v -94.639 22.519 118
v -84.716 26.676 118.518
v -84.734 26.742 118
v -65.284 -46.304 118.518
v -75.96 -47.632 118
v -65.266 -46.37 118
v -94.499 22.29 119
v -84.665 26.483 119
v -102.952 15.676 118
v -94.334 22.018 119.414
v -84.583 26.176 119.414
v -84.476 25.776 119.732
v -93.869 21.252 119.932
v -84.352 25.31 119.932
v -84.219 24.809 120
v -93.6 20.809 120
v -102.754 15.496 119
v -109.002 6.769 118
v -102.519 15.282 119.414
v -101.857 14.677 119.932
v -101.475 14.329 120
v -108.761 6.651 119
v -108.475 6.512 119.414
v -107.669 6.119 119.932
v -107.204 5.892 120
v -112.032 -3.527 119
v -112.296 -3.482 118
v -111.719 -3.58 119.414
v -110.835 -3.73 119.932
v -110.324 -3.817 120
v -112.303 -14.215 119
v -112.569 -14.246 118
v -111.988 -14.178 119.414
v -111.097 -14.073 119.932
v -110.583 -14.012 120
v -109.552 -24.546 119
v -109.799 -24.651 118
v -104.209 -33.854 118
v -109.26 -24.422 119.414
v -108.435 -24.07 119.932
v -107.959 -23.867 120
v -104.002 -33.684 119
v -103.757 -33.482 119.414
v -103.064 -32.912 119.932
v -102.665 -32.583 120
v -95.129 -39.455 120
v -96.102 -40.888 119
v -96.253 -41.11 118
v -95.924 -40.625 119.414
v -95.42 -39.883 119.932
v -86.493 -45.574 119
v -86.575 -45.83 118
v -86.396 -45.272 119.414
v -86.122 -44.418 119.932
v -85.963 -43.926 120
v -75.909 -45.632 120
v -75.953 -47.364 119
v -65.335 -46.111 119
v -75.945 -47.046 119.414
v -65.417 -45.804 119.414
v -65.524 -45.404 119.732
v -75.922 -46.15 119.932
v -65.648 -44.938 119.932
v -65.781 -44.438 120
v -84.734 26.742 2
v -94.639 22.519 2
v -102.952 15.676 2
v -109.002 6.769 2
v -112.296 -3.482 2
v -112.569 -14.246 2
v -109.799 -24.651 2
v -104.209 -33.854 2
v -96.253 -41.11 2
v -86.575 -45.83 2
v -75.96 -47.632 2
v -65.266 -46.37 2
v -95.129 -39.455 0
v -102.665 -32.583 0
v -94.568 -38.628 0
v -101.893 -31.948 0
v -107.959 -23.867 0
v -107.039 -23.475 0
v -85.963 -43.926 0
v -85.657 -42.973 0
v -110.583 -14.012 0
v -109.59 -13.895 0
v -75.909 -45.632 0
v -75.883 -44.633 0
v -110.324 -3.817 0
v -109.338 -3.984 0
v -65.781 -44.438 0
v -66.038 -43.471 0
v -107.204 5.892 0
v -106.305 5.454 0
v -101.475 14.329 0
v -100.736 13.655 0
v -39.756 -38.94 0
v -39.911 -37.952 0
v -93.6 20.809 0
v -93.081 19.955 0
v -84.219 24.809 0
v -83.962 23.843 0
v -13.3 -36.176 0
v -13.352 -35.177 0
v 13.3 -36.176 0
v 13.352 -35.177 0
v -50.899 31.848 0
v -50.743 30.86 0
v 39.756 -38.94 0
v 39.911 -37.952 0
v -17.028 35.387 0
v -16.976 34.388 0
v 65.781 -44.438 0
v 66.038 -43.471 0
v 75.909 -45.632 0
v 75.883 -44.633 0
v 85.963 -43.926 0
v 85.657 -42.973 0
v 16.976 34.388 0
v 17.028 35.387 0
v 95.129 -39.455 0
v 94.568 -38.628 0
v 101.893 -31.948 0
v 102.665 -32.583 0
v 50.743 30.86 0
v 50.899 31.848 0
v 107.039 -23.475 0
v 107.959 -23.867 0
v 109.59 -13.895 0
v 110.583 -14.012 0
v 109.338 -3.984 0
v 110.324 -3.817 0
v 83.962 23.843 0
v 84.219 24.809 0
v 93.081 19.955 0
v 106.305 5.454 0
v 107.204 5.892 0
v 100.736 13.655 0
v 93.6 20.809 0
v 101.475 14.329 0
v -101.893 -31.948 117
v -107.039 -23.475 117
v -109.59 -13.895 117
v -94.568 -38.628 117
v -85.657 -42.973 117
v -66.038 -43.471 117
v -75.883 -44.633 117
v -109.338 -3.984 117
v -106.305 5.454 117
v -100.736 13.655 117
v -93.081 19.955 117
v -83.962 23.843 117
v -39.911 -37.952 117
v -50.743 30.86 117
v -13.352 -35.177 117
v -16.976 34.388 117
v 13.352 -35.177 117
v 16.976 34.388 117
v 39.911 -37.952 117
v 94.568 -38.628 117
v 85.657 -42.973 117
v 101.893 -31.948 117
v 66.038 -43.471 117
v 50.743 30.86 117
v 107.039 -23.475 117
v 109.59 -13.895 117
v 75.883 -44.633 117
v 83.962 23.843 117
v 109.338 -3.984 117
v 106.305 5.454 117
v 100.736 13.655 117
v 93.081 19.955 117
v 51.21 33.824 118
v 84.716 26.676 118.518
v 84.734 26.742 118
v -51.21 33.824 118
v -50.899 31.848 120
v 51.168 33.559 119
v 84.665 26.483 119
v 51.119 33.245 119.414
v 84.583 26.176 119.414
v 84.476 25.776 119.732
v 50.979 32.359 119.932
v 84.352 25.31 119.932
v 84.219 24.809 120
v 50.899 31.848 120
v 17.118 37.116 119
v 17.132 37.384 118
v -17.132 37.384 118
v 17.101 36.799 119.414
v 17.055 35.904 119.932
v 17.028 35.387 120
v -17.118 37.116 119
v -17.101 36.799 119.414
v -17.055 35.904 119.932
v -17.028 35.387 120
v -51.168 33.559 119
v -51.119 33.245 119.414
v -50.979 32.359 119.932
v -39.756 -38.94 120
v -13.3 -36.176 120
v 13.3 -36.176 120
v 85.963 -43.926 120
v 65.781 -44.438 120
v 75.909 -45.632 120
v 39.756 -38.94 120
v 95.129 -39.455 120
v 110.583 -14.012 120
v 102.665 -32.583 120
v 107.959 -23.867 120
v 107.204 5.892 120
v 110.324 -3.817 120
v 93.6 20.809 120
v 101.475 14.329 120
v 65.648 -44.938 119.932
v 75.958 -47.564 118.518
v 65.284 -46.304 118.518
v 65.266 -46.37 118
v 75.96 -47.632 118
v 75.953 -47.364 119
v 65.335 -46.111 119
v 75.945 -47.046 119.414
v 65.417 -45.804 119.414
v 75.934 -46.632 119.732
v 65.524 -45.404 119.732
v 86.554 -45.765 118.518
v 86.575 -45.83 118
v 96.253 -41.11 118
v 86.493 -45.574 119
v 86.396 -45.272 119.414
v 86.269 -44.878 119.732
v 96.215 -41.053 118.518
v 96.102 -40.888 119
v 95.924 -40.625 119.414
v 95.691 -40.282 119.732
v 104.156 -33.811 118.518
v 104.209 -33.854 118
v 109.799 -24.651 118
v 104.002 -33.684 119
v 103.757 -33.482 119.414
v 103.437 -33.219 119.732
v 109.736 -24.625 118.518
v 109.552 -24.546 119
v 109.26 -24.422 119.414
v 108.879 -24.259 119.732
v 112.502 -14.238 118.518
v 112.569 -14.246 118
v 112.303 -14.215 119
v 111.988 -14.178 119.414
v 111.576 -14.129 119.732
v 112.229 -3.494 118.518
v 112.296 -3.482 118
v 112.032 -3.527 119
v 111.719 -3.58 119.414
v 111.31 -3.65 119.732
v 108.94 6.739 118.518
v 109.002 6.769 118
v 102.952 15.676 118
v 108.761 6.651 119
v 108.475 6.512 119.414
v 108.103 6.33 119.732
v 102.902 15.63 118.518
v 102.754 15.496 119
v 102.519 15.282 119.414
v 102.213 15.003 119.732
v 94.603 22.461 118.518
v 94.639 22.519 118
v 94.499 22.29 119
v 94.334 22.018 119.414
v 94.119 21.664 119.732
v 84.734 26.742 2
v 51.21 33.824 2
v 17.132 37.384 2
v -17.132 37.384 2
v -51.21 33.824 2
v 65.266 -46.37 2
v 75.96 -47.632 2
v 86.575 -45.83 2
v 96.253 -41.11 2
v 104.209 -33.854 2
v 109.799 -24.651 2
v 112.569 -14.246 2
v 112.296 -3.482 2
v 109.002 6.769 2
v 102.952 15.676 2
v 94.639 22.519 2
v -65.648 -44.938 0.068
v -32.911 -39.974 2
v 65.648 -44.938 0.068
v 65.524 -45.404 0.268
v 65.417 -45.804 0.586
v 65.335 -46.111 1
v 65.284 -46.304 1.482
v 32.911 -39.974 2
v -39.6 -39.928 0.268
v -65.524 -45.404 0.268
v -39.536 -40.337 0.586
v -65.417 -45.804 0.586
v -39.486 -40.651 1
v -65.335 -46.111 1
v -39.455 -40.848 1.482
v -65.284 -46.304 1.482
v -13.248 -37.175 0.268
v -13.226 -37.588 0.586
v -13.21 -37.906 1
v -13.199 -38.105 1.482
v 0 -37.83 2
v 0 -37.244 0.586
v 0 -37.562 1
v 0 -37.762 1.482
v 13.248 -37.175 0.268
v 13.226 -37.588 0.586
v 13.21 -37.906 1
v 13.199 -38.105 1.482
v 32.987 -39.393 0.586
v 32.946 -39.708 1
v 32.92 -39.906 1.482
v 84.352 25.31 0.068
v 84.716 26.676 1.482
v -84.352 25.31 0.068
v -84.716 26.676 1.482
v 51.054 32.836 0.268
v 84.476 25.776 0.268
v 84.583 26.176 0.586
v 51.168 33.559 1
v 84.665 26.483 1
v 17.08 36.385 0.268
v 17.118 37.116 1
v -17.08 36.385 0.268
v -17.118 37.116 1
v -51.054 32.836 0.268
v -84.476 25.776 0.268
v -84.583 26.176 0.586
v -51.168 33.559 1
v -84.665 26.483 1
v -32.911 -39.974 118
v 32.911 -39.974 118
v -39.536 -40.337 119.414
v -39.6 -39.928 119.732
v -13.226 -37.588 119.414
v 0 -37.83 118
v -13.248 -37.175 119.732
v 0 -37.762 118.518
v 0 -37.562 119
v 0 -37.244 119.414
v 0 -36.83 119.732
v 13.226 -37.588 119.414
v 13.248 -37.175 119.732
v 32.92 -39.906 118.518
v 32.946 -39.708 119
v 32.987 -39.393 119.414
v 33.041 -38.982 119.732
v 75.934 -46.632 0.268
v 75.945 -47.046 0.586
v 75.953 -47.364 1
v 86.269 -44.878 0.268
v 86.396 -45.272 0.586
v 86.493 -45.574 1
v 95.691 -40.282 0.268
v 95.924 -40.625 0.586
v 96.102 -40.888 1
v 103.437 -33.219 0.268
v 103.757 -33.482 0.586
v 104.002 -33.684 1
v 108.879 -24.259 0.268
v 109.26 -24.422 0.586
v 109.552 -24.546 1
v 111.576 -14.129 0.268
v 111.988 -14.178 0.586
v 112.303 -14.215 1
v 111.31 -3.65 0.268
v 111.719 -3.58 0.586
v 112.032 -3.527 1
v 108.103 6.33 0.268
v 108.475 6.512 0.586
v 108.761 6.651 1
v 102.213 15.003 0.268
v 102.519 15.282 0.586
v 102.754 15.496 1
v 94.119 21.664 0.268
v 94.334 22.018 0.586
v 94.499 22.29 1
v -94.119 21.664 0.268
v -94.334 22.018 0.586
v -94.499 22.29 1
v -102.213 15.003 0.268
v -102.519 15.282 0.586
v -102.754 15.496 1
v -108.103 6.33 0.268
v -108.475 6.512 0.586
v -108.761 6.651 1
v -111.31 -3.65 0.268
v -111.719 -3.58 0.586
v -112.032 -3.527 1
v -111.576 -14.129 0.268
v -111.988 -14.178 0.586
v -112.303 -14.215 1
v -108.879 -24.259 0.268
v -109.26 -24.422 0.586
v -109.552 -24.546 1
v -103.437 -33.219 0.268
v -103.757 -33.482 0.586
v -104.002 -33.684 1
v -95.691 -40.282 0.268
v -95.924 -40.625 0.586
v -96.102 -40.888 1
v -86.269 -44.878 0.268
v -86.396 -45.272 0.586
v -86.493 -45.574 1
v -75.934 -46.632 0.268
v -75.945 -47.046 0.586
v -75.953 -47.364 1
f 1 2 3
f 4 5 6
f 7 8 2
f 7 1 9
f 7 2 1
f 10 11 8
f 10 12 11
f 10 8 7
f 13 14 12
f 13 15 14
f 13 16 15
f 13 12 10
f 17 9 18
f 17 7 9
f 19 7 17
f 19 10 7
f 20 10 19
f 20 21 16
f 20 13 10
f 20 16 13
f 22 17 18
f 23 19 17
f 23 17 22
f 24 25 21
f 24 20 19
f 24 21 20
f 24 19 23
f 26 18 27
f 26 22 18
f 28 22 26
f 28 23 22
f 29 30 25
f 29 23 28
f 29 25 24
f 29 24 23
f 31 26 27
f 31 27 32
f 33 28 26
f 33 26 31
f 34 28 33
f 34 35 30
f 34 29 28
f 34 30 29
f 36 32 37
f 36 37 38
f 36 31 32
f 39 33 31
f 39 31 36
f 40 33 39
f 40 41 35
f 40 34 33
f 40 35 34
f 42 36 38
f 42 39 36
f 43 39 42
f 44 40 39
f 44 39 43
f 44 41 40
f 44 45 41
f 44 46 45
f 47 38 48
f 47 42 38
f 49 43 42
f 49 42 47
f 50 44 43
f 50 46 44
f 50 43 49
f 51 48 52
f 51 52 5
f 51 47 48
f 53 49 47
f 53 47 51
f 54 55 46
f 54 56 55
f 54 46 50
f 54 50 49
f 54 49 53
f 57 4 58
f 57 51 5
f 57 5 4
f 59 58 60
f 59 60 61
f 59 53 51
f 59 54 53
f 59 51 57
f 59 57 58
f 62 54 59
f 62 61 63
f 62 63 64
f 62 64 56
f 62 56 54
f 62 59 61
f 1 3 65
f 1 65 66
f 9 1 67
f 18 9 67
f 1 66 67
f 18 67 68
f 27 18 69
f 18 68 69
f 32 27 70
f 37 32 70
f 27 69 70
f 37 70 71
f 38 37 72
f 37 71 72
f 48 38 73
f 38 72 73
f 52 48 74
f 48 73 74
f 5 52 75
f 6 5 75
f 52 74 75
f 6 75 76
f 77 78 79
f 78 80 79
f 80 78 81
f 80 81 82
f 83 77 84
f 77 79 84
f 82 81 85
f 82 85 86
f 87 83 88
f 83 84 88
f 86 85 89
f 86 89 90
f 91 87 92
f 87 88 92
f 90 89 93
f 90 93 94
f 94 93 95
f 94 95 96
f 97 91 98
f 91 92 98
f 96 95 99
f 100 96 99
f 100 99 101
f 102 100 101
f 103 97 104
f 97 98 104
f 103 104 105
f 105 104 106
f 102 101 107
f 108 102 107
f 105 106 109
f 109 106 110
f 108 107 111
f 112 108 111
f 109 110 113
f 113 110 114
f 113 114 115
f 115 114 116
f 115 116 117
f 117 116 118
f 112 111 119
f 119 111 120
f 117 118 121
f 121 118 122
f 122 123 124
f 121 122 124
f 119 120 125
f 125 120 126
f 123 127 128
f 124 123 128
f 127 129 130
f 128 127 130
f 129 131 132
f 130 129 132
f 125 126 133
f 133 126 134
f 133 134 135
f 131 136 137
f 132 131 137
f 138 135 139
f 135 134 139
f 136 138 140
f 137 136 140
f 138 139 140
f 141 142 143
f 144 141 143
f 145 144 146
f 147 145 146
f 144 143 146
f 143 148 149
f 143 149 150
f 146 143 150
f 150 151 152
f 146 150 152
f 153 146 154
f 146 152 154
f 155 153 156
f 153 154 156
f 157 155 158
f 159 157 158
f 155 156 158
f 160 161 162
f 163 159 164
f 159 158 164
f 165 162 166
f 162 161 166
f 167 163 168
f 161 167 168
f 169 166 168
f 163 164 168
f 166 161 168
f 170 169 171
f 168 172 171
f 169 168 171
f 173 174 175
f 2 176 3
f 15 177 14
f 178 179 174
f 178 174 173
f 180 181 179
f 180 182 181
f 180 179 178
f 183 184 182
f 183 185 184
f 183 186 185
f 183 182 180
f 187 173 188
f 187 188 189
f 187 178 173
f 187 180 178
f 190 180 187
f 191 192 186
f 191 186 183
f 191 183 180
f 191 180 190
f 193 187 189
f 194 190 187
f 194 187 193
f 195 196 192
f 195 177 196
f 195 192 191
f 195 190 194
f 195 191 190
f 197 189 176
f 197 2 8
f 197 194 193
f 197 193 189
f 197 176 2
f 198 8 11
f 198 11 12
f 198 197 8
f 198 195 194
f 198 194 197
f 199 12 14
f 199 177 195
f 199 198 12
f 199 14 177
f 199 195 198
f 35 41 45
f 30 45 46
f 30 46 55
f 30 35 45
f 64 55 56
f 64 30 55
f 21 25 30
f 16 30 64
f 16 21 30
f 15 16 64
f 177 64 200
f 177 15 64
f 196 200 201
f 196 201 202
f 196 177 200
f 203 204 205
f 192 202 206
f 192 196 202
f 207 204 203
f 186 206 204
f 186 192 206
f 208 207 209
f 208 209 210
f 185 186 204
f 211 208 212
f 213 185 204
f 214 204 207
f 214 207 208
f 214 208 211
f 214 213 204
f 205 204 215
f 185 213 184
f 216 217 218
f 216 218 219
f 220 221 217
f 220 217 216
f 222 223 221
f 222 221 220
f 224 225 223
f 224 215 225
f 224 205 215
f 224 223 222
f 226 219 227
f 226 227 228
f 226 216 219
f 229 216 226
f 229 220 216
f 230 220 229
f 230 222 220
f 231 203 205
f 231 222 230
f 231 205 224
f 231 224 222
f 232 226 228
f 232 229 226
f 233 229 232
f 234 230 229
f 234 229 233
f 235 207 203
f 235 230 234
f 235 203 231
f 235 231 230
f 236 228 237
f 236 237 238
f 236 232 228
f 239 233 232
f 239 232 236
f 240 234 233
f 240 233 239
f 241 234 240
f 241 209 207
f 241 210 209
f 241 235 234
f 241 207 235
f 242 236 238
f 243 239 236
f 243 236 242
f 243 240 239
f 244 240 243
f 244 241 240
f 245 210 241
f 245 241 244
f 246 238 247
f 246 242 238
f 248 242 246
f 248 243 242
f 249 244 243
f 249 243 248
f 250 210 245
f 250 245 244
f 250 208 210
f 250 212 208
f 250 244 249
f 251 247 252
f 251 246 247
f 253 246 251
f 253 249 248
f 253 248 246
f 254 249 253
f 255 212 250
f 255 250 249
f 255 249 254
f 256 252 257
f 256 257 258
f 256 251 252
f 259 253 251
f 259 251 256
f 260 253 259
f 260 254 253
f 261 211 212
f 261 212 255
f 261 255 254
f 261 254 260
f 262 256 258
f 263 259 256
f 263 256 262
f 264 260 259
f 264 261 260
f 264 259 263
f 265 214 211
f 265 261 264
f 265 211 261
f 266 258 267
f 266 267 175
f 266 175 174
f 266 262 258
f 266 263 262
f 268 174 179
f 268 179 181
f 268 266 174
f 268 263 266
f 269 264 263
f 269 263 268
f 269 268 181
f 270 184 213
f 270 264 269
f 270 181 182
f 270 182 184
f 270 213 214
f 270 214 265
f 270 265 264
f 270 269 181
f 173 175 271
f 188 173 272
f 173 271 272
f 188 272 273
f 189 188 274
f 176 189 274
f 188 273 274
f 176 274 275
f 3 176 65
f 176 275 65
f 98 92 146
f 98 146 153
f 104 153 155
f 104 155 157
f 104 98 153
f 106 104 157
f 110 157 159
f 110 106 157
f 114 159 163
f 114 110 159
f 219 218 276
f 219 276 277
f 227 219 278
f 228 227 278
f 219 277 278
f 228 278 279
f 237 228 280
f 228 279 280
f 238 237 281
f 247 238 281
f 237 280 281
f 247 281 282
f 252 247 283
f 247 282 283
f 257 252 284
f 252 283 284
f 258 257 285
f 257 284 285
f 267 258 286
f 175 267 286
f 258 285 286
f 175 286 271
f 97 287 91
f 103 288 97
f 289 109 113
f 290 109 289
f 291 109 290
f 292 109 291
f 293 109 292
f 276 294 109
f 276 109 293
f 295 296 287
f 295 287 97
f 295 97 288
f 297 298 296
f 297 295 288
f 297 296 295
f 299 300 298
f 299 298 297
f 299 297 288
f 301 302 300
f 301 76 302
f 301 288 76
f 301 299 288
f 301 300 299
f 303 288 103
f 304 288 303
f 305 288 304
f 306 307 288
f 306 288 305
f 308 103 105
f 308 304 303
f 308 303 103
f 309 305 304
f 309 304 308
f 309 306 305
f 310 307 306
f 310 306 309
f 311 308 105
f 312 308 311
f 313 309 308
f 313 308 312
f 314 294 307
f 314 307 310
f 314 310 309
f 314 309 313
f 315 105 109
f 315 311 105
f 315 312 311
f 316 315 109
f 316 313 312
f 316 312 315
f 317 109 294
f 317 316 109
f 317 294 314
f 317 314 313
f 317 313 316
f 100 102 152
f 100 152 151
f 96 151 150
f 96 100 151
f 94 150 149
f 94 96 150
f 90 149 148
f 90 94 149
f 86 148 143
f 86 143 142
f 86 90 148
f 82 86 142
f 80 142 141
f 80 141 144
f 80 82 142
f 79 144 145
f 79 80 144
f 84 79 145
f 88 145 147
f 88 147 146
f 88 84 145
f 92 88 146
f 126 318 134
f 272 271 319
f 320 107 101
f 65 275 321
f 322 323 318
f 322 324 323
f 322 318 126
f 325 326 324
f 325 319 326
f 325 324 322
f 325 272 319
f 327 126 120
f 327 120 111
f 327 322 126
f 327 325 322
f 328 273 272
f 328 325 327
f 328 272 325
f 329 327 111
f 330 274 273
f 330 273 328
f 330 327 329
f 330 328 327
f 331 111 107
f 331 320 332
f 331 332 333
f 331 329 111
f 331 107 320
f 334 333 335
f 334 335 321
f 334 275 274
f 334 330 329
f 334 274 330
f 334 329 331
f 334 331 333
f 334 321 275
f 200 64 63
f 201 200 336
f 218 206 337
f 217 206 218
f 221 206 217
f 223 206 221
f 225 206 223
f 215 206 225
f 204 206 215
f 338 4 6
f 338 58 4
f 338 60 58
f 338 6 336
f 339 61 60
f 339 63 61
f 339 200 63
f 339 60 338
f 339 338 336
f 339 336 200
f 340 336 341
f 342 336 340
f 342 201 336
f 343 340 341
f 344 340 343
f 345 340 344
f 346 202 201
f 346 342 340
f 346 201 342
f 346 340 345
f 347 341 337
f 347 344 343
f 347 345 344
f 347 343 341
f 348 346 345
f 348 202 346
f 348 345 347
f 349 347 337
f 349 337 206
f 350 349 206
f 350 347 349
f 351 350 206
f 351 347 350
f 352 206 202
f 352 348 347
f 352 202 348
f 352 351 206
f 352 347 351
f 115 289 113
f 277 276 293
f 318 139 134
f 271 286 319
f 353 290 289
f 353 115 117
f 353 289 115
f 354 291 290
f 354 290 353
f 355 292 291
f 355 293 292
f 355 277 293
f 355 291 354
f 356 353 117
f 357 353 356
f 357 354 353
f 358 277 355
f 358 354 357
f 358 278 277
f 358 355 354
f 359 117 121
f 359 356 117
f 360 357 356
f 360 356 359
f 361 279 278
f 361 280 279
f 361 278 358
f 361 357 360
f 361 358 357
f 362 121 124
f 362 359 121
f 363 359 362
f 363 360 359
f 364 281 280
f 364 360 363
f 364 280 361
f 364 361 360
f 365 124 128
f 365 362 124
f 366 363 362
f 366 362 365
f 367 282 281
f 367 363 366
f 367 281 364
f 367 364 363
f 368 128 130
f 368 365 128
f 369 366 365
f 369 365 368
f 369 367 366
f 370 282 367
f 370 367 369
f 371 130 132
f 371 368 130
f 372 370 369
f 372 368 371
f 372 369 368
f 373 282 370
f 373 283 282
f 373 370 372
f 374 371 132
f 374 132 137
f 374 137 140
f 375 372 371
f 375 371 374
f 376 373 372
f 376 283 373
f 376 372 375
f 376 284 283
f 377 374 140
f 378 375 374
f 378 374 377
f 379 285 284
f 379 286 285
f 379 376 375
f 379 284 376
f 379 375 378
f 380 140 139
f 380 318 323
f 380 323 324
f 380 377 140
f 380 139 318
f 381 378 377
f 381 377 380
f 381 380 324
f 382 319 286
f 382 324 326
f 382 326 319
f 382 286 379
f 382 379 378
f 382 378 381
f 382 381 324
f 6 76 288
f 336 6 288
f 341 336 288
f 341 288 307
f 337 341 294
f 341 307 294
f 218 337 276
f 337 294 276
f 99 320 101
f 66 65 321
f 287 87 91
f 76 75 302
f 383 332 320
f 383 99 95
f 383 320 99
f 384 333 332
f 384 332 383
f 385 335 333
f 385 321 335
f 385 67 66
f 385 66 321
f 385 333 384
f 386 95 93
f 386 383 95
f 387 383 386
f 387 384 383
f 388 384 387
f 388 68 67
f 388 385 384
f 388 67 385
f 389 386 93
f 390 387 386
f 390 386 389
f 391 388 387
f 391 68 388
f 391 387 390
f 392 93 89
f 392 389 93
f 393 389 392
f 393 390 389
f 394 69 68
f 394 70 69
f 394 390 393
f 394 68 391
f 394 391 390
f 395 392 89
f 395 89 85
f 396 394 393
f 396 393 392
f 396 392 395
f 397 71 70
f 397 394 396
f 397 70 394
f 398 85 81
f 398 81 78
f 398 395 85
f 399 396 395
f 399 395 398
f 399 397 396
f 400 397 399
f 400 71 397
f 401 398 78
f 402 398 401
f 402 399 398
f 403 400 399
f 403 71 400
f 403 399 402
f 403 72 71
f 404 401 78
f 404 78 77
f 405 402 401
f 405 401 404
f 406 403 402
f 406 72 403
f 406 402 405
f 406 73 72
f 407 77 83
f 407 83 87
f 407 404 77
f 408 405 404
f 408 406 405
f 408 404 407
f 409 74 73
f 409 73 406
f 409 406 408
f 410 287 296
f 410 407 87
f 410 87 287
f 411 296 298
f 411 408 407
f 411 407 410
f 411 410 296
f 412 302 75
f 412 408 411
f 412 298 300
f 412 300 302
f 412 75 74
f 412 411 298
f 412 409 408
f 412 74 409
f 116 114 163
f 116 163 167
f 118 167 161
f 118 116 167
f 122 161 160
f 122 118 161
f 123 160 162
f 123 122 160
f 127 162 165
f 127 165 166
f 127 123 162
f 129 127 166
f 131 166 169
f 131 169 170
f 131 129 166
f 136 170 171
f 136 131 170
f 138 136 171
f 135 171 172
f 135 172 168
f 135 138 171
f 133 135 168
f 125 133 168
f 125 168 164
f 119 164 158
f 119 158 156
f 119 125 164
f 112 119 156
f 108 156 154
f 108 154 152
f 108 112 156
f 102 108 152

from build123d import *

# Parameters (mm, degrees)
BOSS_EXTRU_1_DEPTH = 120
CONG_1_R           = 2
CONG_2_R           = 2
COQUE1_DEPTH       = 117


# Read off the part's stored shape, not the designer's step: Coque1
with BuildPart() as part:
    # Esquisse2 → Boss.-Extru.1 (new body)
    with BuildSketch(Plane.XY):
        with BuildLine():
            ThreePointArc((84.733796148, 26.7419608), (0, 37.829829119), (-84.733796148, 26.7419608))
            ThreePointArc((-84.733796148, 26.7419608), (-111.556110074, -19.547945422), (-65.266203852, -46.370259347))
            ThreePointArc((-65.266203852, -46.370259347), (0, -37.829829119), (65.266203852, -46.370259347))
            ThreePointArc((65.266203852, -46.370259347), (111.556110074, -19.547945422), (84.733796148, 26.7419608))
        make_face()
    extrude(amount=BOSS_EXTRU_1_DEPTH)

    # Congé1
    cong_1_edges = [part.edges().sort_by_distance(p)[0] for p in [
        (-111.556110074, -19.547945422, 120),
        (0, -37.829829119, 120),
        (111.556110074, -19.547945422, 120),
        (0, 37.829829119, 120),
    ]]
    fillet(cong_1_edges, radius=CONG_1_R)

    # Congé2
    cong_2_edges = [part.edges().sort_by_distance(p)[0] for p in [
        (0, -37.829829119, 0),
        (-111.556110074, -19.547945422, 0),
        (0, 37.829829119, 0),
        (111.556110074, -19.547945422, 0),
    ]]
    fillet(cong_2_edges, radius=CONG_2_R)

    # Coque1 outline → Coque1 (cut)
    with BuildSketch(Plane.XY):
        with BuildLine():
            ThreePointArc((66.038118215, -43.471268451), (108.657119178, -18.776031059), (83.961881785, 23.842969904))
            ThreePointArc((83.961881785, 23.842969904), (0, 34.829829119), (-83.961881785, 23.842969904))
            ThreePointArc((-83.961881785, 23.842969904), (-108.657119178, -18.776031059), (-66.038118215, -43.471268451))
            ThreePointArc((-66.038118215, -43.471268451), (0, -34.829829119), (66.038118215, -43.471268451))
        make_face()
    extrude(amount=COQUE1_DEPTH, mode=Mode.SUBTRACT)


solid = part.part
